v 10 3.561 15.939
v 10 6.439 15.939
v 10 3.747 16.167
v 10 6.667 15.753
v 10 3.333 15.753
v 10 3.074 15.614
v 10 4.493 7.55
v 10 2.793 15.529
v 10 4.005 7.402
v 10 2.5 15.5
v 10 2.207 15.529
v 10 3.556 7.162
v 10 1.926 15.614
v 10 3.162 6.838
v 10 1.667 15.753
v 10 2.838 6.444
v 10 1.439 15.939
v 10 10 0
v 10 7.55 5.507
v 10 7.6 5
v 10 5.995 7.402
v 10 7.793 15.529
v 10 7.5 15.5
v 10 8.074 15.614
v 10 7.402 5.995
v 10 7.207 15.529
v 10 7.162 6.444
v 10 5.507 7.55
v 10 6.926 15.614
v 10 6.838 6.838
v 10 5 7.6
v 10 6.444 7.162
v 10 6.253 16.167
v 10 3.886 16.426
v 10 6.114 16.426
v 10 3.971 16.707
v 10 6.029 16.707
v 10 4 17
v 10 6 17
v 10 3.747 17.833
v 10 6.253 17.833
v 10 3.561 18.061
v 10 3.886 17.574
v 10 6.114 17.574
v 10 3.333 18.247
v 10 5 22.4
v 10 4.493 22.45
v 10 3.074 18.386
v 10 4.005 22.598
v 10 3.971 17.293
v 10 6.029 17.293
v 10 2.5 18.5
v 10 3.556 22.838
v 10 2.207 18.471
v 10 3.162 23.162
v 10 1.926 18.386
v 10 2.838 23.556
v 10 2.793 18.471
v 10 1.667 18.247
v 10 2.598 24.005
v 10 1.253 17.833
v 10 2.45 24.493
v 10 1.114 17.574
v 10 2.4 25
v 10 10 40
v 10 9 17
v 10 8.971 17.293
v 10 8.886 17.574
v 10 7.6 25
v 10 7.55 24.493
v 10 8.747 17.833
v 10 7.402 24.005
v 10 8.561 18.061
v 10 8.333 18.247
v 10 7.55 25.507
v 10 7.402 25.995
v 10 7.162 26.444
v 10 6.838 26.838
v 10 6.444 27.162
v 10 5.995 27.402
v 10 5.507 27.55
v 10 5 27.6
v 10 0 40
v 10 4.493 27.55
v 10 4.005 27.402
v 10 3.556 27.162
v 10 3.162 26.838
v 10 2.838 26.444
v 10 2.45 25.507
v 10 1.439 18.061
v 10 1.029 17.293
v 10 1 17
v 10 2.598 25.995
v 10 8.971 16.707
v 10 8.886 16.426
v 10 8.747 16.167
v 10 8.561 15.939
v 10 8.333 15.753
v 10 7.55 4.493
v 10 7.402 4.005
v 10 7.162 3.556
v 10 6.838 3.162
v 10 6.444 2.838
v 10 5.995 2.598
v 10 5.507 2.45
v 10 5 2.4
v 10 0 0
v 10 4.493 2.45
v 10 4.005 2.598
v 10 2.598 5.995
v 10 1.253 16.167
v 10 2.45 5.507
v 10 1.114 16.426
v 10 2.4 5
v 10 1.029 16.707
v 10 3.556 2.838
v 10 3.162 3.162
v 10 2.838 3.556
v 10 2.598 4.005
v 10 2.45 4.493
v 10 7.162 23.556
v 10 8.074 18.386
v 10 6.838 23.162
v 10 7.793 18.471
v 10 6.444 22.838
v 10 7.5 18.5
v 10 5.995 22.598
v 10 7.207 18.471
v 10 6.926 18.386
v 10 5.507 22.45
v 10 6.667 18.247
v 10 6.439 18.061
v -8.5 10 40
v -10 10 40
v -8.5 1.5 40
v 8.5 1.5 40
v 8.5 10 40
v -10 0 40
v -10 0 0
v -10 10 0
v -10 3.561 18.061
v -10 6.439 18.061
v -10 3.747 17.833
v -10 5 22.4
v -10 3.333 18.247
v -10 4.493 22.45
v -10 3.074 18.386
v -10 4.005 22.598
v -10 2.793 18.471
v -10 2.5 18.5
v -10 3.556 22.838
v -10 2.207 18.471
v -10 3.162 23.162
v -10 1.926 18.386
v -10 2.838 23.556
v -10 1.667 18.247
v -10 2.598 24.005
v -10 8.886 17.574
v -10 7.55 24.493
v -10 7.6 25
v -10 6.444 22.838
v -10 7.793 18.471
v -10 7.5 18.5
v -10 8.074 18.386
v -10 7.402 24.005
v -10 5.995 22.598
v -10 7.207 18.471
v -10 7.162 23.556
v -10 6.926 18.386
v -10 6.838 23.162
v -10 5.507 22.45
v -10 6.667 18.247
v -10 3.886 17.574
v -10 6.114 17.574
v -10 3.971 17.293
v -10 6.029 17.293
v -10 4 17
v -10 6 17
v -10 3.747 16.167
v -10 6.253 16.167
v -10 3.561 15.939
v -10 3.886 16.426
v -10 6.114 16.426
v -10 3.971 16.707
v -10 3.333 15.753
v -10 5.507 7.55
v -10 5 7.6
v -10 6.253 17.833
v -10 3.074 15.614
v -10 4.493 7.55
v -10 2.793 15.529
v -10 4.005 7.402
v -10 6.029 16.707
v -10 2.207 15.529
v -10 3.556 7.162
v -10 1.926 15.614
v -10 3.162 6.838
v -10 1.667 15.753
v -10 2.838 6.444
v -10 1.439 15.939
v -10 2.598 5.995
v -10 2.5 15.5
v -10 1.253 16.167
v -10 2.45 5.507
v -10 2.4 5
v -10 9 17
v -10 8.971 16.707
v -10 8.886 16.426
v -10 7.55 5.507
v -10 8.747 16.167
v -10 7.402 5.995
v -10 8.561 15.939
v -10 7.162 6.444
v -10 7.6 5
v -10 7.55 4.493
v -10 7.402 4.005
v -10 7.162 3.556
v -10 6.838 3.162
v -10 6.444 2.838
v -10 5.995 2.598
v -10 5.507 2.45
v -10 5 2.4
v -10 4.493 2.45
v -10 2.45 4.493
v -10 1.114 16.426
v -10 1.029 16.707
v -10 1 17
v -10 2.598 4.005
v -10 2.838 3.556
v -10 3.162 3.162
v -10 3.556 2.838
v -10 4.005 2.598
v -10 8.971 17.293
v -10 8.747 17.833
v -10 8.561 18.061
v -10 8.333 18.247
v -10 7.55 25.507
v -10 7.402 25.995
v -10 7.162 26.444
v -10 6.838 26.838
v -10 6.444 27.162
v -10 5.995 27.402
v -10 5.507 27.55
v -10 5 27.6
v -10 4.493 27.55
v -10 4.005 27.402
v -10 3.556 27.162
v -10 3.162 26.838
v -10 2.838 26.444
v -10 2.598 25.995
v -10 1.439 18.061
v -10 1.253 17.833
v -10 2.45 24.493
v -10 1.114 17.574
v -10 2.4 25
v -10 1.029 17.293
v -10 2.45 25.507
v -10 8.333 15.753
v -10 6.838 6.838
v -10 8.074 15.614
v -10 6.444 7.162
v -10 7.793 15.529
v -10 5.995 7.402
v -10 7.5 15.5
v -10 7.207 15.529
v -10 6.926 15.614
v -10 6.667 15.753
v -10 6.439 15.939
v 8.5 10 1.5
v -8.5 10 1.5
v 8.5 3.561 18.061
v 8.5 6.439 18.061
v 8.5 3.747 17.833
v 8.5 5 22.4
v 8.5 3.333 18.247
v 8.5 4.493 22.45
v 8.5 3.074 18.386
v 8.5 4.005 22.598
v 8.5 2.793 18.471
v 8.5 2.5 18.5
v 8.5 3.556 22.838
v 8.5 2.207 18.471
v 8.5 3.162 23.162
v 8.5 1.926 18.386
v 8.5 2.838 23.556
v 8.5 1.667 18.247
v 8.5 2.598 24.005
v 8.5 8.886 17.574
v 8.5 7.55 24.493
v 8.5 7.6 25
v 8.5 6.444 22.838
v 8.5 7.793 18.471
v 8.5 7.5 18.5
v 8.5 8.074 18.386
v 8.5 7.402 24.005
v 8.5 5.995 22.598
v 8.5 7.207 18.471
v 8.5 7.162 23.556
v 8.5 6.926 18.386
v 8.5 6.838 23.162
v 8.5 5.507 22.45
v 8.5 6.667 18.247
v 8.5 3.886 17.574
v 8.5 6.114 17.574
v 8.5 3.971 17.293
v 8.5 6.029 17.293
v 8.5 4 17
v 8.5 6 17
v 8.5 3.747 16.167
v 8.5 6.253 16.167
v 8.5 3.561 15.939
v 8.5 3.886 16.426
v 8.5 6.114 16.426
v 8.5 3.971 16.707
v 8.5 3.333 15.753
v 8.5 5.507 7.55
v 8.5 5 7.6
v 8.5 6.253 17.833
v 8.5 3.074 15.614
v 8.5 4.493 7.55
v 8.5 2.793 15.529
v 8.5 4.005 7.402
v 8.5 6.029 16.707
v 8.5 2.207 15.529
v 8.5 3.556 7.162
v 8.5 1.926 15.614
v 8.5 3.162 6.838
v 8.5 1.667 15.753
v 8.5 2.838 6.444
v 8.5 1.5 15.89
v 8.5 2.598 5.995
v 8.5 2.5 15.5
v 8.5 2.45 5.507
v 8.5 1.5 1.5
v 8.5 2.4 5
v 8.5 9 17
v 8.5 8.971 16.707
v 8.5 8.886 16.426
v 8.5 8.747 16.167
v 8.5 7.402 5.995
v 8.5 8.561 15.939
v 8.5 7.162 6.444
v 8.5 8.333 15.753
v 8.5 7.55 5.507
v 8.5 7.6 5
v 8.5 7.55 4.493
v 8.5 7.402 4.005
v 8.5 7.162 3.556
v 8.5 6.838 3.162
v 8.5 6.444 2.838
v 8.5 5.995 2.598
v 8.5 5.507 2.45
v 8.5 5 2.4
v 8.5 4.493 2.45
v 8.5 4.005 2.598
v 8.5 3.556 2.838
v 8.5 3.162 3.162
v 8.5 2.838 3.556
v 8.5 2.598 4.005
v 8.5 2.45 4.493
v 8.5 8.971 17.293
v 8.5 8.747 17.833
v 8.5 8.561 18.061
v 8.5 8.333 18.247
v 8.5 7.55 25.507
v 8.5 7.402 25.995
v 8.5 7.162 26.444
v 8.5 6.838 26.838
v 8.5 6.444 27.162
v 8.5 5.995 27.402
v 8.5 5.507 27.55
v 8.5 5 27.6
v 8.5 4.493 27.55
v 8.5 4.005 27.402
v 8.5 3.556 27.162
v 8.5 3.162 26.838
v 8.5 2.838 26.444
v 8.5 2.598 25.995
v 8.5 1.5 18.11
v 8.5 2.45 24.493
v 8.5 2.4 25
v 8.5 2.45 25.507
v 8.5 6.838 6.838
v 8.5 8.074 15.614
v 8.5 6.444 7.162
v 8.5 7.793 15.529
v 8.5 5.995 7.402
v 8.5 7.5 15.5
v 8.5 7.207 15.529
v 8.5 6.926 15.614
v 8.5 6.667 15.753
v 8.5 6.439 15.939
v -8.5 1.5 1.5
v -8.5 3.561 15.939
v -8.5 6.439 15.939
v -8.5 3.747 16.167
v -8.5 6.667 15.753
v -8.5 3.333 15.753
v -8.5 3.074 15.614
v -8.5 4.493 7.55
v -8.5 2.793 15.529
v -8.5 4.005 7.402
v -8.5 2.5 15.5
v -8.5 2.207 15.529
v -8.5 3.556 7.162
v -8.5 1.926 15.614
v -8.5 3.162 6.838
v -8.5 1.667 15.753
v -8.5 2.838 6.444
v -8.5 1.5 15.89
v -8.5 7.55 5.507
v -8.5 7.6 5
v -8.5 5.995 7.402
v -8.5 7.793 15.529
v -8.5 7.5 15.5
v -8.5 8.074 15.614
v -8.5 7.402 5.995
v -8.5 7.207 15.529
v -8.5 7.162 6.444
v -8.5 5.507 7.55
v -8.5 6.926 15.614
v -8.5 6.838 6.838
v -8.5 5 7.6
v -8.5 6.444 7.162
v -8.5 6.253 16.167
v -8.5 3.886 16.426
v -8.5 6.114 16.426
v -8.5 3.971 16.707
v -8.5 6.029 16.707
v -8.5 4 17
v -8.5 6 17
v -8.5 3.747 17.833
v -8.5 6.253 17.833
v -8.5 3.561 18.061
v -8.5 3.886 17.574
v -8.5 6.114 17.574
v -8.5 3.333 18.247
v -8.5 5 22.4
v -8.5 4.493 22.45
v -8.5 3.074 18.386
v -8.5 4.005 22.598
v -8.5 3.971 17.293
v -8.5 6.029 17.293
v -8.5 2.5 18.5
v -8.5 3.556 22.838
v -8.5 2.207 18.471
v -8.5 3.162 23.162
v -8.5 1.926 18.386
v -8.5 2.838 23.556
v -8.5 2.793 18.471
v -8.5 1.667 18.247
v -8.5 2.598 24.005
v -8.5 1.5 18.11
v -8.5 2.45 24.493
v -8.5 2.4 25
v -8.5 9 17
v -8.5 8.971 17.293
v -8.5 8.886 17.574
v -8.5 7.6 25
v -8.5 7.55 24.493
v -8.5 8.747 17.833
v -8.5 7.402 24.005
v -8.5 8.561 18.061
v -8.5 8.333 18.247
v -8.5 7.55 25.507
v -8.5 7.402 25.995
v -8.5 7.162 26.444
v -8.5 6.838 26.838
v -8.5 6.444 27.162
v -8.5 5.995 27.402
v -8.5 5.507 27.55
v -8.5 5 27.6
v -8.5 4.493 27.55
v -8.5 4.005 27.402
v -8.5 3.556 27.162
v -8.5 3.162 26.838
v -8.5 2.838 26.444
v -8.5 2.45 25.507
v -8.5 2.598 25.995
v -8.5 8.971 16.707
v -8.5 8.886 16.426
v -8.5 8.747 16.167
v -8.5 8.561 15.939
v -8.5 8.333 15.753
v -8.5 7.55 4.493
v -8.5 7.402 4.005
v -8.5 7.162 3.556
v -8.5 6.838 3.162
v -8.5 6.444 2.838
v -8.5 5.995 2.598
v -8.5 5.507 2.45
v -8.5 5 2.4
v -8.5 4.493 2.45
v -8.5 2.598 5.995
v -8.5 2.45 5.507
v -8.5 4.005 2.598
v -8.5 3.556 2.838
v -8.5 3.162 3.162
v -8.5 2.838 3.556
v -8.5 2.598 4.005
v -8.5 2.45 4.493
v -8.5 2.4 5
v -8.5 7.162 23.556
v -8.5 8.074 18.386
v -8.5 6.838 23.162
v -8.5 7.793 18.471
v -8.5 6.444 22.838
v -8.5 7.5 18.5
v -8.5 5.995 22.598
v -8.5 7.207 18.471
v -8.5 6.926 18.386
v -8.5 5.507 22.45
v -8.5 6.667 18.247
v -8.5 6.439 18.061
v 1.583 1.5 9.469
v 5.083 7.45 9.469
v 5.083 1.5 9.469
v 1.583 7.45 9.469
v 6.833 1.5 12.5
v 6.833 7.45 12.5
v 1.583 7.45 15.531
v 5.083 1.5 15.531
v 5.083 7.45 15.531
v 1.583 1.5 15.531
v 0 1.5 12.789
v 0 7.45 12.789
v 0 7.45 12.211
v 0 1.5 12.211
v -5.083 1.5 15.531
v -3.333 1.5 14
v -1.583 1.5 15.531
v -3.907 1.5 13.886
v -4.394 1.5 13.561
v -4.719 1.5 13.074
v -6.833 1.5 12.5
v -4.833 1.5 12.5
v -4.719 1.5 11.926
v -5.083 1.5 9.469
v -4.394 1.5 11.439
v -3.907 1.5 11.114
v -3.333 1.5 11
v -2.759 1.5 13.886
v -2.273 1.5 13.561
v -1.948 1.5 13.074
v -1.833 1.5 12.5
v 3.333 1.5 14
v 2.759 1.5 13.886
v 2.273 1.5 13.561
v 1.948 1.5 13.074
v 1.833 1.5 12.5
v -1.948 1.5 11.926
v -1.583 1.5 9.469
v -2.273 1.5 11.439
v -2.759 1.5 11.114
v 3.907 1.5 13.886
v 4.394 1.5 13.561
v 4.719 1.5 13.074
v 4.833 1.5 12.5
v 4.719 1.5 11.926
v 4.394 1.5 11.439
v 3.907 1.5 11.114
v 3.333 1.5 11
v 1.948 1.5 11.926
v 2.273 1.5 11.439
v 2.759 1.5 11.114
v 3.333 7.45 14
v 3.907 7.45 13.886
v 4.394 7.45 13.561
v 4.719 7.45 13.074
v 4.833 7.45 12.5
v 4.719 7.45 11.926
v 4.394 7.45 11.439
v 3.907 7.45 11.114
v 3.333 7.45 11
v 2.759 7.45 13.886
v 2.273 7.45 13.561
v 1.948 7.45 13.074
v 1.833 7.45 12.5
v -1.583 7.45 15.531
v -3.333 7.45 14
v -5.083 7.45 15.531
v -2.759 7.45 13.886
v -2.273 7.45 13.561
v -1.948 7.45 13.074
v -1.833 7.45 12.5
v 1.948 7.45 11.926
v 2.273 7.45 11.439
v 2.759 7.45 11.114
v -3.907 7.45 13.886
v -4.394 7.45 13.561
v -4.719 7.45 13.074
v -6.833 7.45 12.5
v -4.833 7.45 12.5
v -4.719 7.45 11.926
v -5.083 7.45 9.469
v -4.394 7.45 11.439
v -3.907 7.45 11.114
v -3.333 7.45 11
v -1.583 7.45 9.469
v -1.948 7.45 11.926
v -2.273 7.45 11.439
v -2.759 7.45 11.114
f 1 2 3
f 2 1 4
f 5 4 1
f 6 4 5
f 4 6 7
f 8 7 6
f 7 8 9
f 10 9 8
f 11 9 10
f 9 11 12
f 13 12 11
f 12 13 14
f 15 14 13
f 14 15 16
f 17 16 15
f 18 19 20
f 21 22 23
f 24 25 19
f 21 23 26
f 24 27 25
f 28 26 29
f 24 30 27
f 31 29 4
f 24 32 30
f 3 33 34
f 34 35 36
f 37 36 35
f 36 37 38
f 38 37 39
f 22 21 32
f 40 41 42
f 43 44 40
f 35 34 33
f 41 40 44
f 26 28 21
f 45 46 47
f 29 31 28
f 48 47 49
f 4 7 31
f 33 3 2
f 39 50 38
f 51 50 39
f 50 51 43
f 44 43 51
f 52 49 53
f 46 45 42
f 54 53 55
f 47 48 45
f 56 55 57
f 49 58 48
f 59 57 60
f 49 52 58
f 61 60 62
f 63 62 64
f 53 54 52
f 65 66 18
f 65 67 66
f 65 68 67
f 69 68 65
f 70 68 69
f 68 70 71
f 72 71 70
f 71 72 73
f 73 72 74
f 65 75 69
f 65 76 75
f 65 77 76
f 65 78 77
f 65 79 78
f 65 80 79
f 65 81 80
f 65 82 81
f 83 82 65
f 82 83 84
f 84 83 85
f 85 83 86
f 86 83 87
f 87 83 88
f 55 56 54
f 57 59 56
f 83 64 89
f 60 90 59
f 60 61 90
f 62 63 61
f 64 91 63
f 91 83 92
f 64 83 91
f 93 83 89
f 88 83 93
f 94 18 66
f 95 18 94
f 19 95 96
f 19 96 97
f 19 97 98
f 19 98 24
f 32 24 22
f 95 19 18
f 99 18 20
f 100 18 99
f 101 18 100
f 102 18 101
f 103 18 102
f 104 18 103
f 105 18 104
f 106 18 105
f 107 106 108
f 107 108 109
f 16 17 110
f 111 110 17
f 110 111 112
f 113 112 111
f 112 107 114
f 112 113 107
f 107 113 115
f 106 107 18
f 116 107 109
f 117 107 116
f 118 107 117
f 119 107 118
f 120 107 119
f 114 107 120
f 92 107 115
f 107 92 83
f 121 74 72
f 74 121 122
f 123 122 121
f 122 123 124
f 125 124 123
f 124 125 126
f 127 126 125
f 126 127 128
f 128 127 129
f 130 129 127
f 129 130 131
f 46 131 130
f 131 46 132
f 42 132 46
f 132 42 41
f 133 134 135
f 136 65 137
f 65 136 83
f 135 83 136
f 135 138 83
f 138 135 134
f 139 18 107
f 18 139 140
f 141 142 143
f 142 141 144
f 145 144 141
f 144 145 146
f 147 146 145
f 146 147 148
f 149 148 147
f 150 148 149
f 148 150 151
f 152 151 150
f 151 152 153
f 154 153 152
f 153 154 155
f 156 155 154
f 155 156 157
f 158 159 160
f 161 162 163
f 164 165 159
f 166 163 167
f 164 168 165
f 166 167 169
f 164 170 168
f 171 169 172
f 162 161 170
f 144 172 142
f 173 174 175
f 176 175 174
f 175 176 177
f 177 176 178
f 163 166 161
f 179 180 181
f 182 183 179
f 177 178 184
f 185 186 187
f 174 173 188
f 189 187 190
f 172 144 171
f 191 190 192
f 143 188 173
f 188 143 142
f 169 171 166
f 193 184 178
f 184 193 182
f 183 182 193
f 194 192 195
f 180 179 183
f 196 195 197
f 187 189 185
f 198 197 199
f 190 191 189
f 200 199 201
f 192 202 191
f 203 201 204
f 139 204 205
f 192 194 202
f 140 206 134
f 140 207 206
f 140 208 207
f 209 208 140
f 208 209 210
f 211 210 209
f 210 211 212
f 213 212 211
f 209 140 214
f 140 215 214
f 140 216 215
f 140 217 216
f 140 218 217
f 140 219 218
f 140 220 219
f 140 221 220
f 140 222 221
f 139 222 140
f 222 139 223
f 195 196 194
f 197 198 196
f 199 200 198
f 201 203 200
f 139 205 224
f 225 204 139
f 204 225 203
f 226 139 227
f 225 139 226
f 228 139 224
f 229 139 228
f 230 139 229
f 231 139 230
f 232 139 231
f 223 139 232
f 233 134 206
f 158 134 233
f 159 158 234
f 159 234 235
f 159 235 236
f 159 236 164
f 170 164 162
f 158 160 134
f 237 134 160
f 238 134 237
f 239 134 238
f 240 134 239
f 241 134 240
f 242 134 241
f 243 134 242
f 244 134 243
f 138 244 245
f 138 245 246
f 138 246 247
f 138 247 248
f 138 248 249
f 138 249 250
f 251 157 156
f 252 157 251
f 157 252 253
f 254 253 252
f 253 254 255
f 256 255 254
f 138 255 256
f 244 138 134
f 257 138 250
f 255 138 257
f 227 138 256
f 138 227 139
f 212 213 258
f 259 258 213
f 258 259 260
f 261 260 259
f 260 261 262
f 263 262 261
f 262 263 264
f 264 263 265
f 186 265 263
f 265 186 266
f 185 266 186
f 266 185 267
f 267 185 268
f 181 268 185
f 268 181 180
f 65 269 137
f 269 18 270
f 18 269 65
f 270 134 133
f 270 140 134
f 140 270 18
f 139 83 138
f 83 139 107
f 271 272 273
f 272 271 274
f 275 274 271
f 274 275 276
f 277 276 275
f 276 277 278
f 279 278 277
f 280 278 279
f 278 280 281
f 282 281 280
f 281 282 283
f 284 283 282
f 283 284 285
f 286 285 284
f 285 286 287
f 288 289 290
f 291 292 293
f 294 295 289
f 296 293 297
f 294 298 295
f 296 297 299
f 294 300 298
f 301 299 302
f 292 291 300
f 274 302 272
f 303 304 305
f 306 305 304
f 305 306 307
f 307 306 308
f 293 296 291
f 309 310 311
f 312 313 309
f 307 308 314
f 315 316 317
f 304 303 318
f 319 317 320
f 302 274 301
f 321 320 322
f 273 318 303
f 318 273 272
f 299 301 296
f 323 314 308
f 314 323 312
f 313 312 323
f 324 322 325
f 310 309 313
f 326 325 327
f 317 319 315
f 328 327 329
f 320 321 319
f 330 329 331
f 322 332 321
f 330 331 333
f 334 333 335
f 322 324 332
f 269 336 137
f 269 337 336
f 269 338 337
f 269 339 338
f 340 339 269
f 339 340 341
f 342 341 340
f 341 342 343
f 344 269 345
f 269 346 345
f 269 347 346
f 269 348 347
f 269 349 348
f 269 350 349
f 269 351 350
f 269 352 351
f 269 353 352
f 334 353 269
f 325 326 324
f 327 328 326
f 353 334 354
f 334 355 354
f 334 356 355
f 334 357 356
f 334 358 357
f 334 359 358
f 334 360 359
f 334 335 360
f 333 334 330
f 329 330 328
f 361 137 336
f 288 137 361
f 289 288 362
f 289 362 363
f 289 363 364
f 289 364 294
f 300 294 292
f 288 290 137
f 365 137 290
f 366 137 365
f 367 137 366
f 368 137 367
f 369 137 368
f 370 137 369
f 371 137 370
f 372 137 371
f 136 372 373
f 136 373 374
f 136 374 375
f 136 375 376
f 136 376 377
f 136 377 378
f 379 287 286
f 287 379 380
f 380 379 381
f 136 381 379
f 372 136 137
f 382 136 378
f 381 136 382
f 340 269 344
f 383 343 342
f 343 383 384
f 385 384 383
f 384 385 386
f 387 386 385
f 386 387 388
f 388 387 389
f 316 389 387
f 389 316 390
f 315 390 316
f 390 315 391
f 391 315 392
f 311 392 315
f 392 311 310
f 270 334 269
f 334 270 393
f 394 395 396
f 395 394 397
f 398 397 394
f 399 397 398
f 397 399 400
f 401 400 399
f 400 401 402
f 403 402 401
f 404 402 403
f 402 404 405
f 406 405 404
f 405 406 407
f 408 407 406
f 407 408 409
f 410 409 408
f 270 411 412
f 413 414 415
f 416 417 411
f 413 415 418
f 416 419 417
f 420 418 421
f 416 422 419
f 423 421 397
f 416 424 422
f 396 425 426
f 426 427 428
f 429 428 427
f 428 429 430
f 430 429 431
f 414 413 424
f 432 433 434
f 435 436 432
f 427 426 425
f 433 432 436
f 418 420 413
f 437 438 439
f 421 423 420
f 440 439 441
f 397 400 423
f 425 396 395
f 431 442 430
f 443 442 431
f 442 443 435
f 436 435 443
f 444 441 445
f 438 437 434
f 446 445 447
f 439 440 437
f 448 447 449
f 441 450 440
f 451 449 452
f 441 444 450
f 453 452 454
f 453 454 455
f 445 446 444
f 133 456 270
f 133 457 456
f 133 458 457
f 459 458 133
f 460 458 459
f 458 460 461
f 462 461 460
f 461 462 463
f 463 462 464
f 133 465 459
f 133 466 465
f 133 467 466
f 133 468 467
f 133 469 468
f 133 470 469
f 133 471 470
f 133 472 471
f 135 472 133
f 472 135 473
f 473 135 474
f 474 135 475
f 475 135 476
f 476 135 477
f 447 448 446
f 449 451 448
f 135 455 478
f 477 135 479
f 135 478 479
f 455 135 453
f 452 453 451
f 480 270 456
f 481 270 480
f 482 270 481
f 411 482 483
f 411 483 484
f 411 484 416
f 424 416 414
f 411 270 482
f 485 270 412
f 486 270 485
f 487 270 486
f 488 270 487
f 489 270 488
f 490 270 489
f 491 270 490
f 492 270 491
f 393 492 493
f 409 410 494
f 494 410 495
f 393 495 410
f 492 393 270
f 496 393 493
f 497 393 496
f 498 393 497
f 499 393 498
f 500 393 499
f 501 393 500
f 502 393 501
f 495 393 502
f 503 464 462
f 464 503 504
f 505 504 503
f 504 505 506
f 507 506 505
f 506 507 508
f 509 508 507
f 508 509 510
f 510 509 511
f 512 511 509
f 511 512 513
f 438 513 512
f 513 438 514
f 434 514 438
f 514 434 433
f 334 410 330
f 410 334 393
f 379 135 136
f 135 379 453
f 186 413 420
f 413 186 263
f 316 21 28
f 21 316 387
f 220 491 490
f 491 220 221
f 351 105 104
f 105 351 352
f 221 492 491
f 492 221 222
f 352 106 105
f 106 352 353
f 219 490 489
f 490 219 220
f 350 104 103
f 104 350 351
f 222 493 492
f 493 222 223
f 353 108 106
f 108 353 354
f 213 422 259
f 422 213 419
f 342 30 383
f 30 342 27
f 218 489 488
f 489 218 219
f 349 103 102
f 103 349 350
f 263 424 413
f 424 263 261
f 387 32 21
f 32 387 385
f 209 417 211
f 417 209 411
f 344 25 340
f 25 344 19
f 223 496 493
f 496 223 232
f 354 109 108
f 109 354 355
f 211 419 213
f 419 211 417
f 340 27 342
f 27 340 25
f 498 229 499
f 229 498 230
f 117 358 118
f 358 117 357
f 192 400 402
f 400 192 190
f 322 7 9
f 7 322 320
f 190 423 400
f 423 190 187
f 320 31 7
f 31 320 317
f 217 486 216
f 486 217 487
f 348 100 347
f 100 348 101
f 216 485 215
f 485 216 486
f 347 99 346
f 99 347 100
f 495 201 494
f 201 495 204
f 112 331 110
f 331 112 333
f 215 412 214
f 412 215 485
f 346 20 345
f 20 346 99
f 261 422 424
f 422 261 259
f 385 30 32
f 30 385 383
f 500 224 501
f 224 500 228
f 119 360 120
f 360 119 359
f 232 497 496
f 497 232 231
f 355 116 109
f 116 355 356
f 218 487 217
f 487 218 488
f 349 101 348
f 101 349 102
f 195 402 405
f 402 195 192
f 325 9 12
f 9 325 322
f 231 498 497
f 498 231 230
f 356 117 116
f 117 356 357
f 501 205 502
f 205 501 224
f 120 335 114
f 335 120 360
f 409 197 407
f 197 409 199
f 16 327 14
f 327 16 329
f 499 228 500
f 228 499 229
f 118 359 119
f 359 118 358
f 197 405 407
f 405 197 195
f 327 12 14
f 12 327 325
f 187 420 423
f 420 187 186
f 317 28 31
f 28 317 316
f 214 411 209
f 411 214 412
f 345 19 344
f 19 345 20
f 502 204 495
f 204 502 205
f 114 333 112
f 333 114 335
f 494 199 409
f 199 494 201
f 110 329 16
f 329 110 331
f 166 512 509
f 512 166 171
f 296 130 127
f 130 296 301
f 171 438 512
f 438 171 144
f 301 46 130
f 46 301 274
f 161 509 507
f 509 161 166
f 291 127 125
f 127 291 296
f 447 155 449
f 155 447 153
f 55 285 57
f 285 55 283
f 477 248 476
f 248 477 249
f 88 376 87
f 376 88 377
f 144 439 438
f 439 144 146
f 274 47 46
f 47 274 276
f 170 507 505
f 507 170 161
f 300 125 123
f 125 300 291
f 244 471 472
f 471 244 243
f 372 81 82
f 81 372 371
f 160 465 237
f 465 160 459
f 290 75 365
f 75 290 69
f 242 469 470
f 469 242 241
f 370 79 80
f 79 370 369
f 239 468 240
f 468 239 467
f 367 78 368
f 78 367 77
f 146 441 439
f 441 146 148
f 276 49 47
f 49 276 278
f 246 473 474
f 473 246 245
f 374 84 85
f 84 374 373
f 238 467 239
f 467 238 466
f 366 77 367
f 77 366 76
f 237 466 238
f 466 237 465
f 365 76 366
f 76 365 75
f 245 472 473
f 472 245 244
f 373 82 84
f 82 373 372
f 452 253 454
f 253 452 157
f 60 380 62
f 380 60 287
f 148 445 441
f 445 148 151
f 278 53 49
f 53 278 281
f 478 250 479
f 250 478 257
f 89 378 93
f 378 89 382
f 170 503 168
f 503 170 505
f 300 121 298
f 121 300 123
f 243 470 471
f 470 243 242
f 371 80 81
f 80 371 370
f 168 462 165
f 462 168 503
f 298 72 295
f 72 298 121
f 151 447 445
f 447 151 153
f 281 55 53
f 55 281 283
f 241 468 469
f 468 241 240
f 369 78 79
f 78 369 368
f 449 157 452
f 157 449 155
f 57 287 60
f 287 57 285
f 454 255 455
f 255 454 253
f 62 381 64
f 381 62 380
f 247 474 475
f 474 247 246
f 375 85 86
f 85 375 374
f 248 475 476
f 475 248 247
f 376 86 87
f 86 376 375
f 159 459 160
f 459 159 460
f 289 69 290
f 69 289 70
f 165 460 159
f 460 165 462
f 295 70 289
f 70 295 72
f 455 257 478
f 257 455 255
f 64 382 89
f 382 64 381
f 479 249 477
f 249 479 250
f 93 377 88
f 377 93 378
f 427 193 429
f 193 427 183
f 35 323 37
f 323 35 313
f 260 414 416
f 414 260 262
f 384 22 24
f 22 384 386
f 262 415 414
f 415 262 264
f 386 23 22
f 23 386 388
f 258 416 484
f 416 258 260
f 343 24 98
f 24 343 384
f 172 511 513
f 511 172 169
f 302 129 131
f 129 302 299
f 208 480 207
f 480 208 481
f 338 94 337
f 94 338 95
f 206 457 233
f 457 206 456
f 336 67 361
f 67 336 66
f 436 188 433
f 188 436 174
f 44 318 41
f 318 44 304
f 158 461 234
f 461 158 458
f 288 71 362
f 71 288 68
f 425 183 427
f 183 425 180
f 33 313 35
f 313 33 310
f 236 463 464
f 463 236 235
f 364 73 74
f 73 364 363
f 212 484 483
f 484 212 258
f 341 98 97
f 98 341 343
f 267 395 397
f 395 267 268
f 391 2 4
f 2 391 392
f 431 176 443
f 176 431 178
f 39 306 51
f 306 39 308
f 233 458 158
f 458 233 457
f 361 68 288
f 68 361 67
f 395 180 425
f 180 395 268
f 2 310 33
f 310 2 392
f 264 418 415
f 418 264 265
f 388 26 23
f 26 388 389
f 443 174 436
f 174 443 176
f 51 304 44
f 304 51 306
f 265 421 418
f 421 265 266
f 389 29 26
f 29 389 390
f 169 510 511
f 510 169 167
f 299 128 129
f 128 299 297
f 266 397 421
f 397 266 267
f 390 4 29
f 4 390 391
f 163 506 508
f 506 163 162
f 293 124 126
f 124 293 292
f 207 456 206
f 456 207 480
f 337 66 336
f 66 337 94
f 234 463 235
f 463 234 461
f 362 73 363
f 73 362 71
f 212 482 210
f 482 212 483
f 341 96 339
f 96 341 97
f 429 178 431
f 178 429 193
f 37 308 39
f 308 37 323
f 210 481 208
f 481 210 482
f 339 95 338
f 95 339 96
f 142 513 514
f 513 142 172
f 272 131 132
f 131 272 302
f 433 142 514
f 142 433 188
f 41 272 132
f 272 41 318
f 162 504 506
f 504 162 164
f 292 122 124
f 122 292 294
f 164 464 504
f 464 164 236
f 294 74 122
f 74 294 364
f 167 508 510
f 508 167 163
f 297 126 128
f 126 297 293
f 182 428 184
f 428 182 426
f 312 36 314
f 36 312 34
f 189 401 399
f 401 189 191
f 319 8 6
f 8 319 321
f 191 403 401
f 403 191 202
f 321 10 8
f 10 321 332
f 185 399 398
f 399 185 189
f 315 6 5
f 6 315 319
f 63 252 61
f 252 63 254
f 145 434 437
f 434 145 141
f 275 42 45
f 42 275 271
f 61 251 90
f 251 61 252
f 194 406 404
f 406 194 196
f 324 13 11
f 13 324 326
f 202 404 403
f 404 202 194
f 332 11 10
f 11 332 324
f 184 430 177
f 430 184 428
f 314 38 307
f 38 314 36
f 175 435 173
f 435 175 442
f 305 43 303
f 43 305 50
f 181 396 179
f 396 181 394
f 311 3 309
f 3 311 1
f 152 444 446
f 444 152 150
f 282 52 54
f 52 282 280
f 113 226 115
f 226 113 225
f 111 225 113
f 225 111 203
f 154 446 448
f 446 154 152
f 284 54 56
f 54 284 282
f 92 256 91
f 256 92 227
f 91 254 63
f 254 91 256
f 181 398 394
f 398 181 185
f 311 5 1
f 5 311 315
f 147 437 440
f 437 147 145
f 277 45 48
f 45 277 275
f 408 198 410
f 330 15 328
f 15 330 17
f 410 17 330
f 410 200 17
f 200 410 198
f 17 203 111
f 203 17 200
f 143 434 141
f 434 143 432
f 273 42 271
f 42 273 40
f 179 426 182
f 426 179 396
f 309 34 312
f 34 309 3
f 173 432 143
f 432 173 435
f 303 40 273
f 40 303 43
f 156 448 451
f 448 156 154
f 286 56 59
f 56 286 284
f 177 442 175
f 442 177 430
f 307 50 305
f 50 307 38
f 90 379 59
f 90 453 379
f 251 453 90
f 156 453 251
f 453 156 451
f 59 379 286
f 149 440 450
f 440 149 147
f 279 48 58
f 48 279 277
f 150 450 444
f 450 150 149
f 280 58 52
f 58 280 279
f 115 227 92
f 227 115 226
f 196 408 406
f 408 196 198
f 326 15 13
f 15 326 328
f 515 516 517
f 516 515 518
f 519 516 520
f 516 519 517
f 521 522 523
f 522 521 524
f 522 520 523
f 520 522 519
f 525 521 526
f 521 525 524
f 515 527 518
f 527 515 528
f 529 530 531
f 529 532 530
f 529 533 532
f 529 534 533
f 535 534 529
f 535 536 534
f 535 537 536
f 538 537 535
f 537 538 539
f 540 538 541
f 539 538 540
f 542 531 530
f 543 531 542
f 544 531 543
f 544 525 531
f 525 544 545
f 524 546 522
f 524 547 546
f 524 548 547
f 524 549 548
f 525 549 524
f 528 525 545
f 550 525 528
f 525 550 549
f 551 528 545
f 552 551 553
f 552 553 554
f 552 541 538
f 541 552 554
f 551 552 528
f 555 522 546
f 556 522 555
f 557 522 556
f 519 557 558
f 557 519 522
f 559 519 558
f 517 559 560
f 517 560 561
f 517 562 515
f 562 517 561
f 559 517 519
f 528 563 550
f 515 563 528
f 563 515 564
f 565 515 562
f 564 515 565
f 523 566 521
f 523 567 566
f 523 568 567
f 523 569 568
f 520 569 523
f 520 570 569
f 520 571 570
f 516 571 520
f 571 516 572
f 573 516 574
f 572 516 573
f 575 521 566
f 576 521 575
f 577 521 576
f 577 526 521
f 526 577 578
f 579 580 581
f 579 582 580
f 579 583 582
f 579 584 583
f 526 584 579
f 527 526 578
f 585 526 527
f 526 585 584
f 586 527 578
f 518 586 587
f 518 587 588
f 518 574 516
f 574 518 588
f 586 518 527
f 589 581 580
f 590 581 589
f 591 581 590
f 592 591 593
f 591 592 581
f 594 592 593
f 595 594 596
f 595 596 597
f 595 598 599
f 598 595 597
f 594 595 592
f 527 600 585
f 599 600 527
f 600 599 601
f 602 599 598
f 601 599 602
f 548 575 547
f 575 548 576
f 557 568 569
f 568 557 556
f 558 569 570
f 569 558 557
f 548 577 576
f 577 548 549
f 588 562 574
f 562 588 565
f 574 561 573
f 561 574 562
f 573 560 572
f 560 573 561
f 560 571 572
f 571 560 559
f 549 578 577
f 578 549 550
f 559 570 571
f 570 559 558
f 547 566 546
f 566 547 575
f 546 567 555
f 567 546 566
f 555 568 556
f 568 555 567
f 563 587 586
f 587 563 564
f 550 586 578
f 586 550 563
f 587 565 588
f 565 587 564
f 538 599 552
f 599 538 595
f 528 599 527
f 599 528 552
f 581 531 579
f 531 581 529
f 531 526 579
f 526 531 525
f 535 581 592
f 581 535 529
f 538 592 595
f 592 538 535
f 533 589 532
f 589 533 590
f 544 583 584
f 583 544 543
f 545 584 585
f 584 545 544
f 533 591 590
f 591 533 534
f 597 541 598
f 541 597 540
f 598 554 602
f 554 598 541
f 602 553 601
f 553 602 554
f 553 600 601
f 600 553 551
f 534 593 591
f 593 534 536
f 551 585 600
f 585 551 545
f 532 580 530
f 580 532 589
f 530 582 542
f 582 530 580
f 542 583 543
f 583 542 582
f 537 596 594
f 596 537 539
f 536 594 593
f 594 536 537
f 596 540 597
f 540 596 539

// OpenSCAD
carriage_l = 20;
carriage_h = 40;
carriage_w = 10;

/* If using bushings or bearings, this is the outer diameter of the
   bushing/bearing. If not using them, this is the outer diameter of the rod
   itself. */
y_rod_d = 5.2; // 3/16 in with fudge.

drive_hole_d = 3; // where the string/line passes through carriage
drive_hole_z_offset = 12; // how high to place the drive holes from the bottom rod hole
drive_hole_z_spacing = 5; // how far apart the drive holes are

rod_hole_z_offset = 5; // how high to place the lower rod hole from bottom of carriage
rod_hole_z_spacing = 20; // how far apart the two rod holes are

wall_thickness = 1.5; // how thick should the walls and floor be?

tension_point_d = 7;
tension_point_h = (carriage_w-wall_thickness)*0.7;
tension_point_screw_d = 3;

ff=0.1;

module rod_holes() {
  module rod_hole() {
    cylinder(d=y_rod_d, h=carriage_l+ff, center=true, $fn=32);
  }
  rotate([0,90,0]) {
    rod_hole();
    translate([-rod_hole_z_spacing,0,0]) rod_hole();
  }
}

module drive_holes() {
  rotate([0,90,0]) translate([0,0,0]) {
    for(offset=[drive_hole_z_spacing/2,-drive_hole_z_spacing/2]) {
      translate([0,offset,0]) cylinder(d=drive_hole_d, h=carriage_l+ff, center=true, $fn=32);
    }
  }
}

module tension_points() {
  module tension_point() {
    rotate([90,0,0]) difference() {
      cylinder(d=tension_point_d, h=tension_point_h, center=true, $fn=6);
      cylinder(d=tension_point_screw_d, h=tension_point_h, center=true, $fn=16);
    }
  }
  for(offset=[carriage_l/6,-carriage_l/6]) {
    translate([offset,(tension_point_h/2)+wall_thickness,(drive_hole_z_offset+rod_hole_z_offset)-(drive_hole_d*1.5)])
      tension_point();
  }
}

module complete_carriage() {
  difference() {
    translate([-carriage_l/2,0,0]) {
      difference() {
        cube([carriage_l, carriage_w, carriage_h]);
        translate([wall_thickness,wall_thickness,wall_thickness])
          cube([carriage_l-(wall_thickness*2), carriage_w-wall_thickness+ff, carriage_h-wall_thickness+ff]);
      }
    }
    translate([0,carriage_w/2,rod_hole_z_offset]) rod_holes();
    translate([0,carriage_w/2,rod_hole_z_offset+drive_hole_z_offset]) drive_holes();
  }
  tension_points();
}


/*intersection() {
  complete_carriage();
  translate([9,0,0]) cube([carriage_l, carriage_w, carriage_h]);
}*/

complete_carriage();

/*tension_points();*/
/*rod_holes();*/
/*drive_holes();*/
